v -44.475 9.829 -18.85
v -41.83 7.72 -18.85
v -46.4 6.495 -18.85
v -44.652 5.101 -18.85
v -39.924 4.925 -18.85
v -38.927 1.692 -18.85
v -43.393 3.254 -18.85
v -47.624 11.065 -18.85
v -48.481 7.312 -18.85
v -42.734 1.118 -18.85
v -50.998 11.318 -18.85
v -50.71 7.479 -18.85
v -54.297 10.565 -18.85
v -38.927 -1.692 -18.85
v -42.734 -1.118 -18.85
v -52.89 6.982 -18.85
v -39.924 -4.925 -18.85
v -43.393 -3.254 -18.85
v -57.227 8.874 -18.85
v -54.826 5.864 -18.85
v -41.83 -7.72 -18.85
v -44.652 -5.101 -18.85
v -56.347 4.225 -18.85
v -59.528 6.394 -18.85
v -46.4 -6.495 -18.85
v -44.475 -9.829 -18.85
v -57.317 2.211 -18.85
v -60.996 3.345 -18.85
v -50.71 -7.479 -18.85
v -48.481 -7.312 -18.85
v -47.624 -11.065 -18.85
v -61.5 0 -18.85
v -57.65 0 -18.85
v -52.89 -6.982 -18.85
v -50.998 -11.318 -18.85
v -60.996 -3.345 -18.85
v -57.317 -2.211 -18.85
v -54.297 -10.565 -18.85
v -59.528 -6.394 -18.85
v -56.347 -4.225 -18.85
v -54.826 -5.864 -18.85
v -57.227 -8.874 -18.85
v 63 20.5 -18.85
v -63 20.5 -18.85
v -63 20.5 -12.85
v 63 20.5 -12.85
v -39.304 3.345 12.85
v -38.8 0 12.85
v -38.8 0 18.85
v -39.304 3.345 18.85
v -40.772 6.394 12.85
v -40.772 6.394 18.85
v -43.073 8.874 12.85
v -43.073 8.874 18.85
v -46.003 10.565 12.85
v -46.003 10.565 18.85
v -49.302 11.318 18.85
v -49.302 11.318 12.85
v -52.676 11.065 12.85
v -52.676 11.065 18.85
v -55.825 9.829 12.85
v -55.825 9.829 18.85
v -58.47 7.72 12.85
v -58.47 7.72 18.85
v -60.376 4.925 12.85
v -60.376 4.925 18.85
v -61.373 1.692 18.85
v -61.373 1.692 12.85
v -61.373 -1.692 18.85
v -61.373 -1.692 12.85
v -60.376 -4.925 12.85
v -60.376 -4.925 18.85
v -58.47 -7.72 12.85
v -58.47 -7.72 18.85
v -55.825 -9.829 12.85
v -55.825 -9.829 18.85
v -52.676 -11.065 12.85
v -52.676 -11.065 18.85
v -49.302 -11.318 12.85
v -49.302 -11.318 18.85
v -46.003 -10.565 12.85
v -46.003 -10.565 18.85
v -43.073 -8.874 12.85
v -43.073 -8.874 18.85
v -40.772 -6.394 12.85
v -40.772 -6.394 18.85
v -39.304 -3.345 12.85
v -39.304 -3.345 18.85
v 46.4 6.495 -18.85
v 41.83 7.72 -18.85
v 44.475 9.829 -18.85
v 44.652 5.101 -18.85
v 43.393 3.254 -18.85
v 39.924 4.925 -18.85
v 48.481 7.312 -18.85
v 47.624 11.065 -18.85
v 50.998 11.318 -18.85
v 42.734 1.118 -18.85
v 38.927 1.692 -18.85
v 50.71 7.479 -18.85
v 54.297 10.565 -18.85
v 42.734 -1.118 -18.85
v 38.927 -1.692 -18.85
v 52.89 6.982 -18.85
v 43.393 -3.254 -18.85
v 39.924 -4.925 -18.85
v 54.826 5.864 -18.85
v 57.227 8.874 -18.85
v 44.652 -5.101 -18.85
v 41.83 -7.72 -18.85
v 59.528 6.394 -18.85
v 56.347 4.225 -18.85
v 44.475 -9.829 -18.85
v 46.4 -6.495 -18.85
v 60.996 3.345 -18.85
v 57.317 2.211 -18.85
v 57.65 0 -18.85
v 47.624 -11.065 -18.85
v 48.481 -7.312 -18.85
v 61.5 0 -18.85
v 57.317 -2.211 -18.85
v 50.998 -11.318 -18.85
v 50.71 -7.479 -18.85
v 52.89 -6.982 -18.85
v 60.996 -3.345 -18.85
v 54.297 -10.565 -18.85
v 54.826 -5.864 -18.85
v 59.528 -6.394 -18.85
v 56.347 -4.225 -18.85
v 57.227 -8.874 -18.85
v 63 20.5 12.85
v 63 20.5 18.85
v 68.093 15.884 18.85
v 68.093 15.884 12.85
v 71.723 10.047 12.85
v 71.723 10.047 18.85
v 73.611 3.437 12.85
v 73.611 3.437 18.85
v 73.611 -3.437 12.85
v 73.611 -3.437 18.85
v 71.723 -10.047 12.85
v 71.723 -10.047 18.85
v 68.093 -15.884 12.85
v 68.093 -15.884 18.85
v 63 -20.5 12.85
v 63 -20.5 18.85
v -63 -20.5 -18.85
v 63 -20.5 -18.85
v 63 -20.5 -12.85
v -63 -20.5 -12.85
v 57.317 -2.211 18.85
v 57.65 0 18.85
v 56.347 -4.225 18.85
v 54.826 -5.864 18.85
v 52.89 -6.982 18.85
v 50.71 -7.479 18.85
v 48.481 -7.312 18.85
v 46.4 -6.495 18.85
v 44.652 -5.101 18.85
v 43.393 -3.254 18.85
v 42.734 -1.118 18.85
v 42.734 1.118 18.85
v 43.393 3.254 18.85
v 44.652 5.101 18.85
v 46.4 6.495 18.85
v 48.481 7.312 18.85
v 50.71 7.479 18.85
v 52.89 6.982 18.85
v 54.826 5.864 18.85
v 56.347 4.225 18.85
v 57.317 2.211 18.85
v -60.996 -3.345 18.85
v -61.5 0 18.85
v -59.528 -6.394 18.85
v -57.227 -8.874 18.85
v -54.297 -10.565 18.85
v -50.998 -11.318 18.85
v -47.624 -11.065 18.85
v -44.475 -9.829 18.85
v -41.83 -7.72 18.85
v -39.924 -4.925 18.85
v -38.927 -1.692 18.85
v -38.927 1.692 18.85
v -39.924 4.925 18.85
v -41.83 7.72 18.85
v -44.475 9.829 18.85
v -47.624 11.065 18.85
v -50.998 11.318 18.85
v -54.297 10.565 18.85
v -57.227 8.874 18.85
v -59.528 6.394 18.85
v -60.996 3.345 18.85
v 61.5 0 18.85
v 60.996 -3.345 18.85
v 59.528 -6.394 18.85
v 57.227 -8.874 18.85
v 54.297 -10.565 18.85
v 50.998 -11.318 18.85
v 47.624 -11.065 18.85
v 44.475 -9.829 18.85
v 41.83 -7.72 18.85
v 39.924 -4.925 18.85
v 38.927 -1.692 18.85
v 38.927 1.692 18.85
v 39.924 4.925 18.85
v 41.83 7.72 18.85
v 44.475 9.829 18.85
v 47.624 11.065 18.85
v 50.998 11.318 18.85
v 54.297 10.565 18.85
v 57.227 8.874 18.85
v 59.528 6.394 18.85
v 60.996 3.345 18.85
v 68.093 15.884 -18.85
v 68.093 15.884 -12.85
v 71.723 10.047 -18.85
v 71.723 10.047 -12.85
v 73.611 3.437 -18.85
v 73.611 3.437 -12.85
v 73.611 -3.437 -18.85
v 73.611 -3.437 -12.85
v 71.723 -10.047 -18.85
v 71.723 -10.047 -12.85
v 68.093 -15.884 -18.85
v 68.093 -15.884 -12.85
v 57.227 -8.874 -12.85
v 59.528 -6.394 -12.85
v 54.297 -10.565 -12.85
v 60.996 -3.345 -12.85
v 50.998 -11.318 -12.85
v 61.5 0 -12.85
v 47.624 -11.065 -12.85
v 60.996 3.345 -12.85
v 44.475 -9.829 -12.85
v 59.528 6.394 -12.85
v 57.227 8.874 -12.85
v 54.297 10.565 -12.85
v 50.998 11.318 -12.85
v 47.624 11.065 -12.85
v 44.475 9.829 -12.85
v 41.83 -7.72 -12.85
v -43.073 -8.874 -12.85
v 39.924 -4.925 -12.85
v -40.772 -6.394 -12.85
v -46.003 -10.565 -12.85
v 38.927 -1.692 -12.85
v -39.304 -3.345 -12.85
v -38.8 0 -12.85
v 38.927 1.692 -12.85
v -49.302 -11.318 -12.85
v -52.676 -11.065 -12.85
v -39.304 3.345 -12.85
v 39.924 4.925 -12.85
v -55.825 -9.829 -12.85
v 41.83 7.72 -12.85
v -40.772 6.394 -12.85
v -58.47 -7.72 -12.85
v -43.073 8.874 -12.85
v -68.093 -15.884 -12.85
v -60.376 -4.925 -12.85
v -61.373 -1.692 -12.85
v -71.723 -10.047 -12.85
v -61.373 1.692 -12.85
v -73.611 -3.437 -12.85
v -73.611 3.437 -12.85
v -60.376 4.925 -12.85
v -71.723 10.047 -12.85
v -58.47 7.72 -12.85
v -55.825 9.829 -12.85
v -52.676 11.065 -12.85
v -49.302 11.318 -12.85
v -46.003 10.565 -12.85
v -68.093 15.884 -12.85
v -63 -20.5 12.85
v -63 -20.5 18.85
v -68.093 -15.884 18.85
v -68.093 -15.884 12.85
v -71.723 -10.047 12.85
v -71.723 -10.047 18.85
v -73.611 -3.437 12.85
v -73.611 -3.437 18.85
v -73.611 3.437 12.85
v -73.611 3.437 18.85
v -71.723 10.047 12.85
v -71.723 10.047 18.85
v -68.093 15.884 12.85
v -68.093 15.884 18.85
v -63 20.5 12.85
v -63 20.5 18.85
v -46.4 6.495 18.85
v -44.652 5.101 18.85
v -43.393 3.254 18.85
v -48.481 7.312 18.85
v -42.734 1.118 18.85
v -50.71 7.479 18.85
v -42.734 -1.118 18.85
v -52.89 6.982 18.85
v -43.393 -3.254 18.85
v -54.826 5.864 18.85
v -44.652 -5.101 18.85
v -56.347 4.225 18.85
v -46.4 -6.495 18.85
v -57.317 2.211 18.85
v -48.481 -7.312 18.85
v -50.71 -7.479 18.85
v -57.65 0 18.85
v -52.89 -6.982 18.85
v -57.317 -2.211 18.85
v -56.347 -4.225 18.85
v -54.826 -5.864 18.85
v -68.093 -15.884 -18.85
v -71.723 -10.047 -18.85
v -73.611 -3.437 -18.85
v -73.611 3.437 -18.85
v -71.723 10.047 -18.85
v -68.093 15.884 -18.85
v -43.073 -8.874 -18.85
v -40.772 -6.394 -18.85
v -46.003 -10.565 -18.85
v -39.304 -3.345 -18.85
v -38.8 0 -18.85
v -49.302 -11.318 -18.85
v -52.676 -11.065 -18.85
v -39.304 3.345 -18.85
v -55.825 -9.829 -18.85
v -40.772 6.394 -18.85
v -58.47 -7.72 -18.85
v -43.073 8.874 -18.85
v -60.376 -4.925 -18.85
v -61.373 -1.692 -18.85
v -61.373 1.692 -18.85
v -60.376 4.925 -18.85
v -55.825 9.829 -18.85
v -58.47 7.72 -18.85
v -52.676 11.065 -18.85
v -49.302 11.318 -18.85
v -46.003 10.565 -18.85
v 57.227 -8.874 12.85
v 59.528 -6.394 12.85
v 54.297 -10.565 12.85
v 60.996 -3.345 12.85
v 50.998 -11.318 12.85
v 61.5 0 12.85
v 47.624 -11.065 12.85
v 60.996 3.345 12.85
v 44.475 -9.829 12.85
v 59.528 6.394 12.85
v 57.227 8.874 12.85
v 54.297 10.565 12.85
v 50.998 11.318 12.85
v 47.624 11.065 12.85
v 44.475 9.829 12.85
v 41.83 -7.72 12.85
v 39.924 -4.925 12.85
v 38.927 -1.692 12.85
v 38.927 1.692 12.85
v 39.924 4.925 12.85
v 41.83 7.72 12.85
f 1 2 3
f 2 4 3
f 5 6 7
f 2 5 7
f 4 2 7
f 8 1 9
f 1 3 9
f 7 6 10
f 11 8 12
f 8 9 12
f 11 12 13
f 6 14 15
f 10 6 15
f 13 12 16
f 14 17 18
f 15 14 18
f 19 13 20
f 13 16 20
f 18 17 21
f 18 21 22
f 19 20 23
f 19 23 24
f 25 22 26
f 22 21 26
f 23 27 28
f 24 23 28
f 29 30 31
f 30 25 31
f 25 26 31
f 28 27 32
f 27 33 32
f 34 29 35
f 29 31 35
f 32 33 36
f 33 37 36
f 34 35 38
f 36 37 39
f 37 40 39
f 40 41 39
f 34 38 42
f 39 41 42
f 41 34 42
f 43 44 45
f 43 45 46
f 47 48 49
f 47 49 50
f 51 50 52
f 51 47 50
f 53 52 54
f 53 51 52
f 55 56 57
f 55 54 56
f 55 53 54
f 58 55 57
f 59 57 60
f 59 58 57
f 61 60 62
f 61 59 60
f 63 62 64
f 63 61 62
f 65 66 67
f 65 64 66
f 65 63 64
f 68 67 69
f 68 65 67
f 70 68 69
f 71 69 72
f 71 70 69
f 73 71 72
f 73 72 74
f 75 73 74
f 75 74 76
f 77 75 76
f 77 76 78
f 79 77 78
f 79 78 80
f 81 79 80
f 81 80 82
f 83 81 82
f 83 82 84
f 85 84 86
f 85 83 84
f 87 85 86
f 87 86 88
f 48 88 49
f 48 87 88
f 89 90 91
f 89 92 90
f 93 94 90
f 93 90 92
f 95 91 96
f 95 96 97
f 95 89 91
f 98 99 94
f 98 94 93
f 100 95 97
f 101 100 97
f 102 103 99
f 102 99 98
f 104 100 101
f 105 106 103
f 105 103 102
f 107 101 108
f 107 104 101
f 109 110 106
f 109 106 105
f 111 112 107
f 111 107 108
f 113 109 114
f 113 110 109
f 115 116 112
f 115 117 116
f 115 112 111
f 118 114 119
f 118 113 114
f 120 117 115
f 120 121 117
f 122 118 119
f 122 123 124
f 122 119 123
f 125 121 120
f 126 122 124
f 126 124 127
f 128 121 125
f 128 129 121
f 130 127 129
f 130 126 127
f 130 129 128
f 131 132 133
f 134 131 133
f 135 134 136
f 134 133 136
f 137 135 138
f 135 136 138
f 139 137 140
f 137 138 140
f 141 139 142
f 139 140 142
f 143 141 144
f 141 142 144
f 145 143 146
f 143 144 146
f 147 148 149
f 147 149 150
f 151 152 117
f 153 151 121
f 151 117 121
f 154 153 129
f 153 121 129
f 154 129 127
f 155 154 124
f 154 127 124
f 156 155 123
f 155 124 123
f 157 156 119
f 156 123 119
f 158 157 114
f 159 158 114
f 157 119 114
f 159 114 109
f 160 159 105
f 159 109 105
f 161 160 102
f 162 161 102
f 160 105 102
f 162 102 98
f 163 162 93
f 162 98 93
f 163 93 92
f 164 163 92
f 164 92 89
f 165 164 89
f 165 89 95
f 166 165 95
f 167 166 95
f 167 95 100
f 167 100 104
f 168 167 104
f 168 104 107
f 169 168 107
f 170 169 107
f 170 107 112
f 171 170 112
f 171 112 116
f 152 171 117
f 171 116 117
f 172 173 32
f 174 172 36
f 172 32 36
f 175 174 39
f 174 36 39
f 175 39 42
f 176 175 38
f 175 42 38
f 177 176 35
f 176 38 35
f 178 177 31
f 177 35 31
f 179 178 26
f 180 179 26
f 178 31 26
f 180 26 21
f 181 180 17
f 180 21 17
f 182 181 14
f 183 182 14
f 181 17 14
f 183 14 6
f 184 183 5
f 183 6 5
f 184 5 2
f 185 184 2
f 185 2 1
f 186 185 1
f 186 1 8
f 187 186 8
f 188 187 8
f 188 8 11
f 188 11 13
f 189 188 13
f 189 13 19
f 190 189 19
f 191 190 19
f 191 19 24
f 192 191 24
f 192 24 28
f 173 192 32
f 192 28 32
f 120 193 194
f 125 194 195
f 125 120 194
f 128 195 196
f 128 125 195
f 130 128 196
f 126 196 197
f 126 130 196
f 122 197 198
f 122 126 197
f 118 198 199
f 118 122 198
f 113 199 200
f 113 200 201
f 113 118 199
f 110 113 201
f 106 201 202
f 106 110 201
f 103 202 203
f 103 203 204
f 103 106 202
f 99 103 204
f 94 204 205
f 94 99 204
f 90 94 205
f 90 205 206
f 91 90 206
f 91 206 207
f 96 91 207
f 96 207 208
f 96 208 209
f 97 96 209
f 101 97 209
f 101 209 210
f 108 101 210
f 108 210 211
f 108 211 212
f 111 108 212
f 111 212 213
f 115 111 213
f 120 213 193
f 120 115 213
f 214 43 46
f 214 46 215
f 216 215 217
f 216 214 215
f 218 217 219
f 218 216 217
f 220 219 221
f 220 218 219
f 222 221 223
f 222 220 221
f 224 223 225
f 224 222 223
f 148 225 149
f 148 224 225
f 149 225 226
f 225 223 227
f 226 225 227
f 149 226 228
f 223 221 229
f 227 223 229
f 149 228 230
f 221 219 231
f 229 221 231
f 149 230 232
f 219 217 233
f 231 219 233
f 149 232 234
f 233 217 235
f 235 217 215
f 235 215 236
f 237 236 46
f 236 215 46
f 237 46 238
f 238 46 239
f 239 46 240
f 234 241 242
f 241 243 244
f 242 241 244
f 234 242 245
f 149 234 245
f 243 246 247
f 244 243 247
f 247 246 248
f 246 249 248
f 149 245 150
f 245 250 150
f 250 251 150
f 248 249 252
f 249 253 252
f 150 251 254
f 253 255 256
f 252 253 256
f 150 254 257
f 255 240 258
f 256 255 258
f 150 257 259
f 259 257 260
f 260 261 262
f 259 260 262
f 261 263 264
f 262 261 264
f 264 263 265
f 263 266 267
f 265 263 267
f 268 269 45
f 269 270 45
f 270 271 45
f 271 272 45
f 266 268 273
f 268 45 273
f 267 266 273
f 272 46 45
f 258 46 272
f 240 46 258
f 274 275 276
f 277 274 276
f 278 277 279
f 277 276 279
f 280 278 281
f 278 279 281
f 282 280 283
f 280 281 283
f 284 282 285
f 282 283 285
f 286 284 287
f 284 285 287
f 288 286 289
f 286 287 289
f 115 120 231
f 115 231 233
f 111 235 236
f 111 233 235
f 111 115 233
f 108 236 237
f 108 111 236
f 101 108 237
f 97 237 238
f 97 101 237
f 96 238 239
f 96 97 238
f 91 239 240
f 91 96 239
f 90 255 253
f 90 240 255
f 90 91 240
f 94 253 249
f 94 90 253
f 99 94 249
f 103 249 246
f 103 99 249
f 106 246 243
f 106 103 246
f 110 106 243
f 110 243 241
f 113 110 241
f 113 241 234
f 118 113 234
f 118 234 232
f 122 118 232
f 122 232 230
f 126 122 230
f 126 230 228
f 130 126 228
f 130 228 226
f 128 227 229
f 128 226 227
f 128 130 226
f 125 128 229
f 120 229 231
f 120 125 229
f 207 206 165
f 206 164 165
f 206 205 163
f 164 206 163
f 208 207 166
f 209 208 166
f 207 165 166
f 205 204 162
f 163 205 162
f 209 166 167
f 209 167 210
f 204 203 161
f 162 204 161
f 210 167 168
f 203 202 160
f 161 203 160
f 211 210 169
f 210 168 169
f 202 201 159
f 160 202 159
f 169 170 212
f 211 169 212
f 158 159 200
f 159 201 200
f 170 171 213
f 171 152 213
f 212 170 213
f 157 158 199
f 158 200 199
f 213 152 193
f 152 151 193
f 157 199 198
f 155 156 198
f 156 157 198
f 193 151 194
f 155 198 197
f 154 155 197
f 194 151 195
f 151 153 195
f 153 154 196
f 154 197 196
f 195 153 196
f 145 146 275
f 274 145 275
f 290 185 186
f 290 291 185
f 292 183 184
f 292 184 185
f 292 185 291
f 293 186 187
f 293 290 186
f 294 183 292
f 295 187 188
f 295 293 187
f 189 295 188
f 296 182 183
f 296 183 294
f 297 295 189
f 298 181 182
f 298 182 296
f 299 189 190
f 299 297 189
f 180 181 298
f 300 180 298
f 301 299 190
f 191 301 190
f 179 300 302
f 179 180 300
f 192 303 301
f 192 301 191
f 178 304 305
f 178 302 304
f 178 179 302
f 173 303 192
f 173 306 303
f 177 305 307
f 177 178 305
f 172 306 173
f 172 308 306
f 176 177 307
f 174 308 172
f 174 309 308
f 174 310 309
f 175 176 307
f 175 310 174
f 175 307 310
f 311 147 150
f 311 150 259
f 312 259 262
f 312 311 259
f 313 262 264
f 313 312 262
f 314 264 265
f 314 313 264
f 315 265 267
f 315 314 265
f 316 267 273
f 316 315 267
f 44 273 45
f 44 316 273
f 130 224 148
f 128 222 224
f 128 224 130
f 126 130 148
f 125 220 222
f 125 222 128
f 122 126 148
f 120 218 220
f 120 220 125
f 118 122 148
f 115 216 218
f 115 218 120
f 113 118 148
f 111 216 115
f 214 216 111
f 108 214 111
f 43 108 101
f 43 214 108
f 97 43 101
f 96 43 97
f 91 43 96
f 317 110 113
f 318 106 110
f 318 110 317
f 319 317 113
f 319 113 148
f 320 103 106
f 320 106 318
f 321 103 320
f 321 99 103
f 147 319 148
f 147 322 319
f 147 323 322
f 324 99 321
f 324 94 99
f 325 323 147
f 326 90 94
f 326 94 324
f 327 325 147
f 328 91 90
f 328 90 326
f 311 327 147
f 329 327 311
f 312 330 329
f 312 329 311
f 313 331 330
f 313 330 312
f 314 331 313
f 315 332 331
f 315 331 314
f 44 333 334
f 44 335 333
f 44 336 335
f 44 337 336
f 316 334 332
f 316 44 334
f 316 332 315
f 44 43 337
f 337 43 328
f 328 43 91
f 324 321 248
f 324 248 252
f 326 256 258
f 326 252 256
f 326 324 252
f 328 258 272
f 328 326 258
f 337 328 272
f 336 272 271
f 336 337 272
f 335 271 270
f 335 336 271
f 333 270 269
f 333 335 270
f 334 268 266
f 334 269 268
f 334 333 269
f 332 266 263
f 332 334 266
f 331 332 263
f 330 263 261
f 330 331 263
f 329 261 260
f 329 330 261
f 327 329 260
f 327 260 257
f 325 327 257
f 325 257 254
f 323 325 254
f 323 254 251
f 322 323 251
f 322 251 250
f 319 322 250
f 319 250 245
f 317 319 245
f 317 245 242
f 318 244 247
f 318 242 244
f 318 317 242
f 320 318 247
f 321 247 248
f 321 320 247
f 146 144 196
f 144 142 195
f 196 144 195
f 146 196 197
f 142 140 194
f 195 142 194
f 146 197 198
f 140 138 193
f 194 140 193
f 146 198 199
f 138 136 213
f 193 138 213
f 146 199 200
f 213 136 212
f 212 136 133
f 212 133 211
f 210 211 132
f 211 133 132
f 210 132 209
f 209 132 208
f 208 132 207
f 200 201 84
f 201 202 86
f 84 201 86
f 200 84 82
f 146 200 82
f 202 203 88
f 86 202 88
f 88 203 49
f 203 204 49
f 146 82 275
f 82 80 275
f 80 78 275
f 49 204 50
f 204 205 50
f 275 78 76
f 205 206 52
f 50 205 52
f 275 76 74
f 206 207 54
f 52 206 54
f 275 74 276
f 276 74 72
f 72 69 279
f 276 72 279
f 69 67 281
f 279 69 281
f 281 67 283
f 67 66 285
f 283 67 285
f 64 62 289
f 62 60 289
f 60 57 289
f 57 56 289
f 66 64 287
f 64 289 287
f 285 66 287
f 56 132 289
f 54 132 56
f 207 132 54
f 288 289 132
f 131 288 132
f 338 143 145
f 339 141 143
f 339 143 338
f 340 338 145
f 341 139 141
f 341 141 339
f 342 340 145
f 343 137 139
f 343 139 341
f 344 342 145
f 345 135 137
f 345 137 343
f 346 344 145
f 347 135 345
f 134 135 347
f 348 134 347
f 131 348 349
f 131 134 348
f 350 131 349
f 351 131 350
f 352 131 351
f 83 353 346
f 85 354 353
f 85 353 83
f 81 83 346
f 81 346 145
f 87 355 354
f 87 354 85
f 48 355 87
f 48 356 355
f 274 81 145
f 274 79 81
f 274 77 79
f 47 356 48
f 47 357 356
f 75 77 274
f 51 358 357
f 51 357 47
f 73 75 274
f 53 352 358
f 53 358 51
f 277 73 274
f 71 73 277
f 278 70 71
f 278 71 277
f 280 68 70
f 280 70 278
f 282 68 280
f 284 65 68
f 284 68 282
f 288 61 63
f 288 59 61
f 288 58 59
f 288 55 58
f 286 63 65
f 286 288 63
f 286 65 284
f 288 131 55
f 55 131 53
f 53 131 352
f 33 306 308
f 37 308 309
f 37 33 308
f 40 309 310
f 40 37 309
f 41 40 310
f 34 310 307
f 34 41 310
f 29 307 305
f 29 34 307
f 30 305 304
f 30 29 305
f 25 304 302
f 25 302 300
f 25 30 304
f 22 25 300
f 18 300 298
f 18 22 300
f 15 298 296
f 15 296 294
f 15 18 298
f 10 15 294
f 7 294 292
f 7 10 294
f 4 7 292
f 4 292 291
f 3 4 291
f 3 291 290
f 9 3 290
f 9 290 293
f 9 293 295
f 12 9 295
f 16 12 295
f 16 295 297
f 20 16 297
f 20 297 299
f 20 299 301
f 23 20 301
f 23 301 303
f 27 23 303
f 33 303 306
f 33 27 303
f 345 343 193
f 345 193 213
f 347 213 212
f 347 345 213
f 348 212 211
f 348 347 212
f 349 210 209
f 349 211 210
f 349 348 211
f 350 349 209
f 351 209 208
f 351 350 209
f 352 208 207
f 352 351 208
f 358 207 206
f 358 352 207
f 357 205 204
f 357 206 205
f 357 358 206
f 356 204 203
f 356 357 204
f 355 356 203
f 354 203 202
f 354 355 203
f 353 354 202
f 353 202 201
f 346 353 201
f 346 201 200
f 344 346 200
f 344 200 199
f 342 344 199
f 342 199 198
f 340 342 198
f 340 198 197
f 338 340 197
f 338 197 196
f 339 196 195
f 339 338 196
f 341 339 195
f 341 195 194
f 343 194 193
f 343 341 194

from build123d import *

# Parameters (mm, degrees)
BOSS_EXTRUDE1_START     = 18.85
BOSS_EXTRUDE1_DEPTH     = 6
SKETCH2_R               = 7.5
CUT_EXTRUDE2_DEPTH      = 79.926516457
CUT_EXTRUDE3_DEPTH      = 79.926516457
CUT_EXTRUDE3_DEPTH_BACK = 79.926516457
SKETCH3_R               = 11.35
BOSS_EXTRUDE2_START     = -18.85
SKETCH4_R               = 11.35
SKETCH4_R_2             = 7.5
BOSS_EXTRUDE2_DEPTH     = 37.7


with BuildPart() as part:
    # Sketch1 → Boss-Extrude1 (new body)
    with BuildSketch(Plane.XY.offset(BOSS_EXTRUDE1_START)):
        with BuildLine():
            Line((-63, 20.5), (63, 20.5))
            ThreePointArc((63, 20.5), (73.85, 0), (63, -20.5))
            Line((63, -20.5), (-63, -20.5))
            ThreePointArc((-63, -20.5), (-73.85, 0), (-63, 20.5))
        make_face()
    extrude(amount=-BOSS_EXTRUDE1_DEPTH)

    # Sketch2 → Cut-Extrude2 (cut, through all)
    with BuildSketch(Plane.XY):
        with Locations((-50.15, 0)):
            Circle(SKETCH2_R)
        with Locations(Location((50.15, 0, 0), (0, 0, 180))):
            Circle(SKETCH2_R)
    extrude(amount=CUT_EXTRUDE2_DEPTH, mode=Mode.SUBTRACT)


with BuildPart() as body_2:
    # Mirror1: mirrored copy
    add(part.part.mirror(Plane.XY))


with BuildPart() as cut_extrude3_tool:
    # Sketch3 → Cut-Extrude3 (new, two sides: drawn at the far end of the back side and taken through both)
    with BuildSketch(Plane.XY.offset(-CUT_EXTRUDE3_DEPTH_BACK)):
        with Locations((-50.15, 0)):
            Circle(SKETCH3_R)
        with Locations((50.15, 0)):
            Circle(SKETCH3_R)
    extrude(amount=CUT_EXTRUDE3_DEPTH + CUT_EXTRUDE3_DEPTH_BACK)


with BuildPart() as part_1:
    add(part.part)

    # Cut-Extrude3: cut by cut_extrude3_tool
    add(cut_extrude3_tool.part, mode=Mode.SUBTRACT)


with BuildPart() as body_2_1:
    add(body_2.part)

    # Cut-Extrude3: cut by cut_extrude3_tool
    add(cut_extrude3_tool.part, mode=Mode.SUBTRACT)


with BuildPart() as body_3:
    # Sketch4 → Boss-Extrude2 (new body)
    with BuildSketch(Plane.XY.offset(BOSS_EXTRUDE2_START)):
        with Locations(Location((-50.15, 0, 0), (0, 0, 180))):
            Circle(SKETCH4_R)
        with Locations(Location((-50.15, 0, 0), (0, 0, 180))):
            Circle(SKETCH4_R_2, mode=Mode.SUBTRACT)
    extrude(amount=BOSS_EXTRUDE2_DEPTH)


with BuildPart() as body_4:
    # Mirror2: mirrored copy
    add(body_3.part.mirror(Plane(origin=(0, 0, 0), x_dir=(0, 0, 1), z_dir=(1, 0, 0))))


solid = Compound([part_1.part, body_2_1.part, body_3.part, body_4.part])
